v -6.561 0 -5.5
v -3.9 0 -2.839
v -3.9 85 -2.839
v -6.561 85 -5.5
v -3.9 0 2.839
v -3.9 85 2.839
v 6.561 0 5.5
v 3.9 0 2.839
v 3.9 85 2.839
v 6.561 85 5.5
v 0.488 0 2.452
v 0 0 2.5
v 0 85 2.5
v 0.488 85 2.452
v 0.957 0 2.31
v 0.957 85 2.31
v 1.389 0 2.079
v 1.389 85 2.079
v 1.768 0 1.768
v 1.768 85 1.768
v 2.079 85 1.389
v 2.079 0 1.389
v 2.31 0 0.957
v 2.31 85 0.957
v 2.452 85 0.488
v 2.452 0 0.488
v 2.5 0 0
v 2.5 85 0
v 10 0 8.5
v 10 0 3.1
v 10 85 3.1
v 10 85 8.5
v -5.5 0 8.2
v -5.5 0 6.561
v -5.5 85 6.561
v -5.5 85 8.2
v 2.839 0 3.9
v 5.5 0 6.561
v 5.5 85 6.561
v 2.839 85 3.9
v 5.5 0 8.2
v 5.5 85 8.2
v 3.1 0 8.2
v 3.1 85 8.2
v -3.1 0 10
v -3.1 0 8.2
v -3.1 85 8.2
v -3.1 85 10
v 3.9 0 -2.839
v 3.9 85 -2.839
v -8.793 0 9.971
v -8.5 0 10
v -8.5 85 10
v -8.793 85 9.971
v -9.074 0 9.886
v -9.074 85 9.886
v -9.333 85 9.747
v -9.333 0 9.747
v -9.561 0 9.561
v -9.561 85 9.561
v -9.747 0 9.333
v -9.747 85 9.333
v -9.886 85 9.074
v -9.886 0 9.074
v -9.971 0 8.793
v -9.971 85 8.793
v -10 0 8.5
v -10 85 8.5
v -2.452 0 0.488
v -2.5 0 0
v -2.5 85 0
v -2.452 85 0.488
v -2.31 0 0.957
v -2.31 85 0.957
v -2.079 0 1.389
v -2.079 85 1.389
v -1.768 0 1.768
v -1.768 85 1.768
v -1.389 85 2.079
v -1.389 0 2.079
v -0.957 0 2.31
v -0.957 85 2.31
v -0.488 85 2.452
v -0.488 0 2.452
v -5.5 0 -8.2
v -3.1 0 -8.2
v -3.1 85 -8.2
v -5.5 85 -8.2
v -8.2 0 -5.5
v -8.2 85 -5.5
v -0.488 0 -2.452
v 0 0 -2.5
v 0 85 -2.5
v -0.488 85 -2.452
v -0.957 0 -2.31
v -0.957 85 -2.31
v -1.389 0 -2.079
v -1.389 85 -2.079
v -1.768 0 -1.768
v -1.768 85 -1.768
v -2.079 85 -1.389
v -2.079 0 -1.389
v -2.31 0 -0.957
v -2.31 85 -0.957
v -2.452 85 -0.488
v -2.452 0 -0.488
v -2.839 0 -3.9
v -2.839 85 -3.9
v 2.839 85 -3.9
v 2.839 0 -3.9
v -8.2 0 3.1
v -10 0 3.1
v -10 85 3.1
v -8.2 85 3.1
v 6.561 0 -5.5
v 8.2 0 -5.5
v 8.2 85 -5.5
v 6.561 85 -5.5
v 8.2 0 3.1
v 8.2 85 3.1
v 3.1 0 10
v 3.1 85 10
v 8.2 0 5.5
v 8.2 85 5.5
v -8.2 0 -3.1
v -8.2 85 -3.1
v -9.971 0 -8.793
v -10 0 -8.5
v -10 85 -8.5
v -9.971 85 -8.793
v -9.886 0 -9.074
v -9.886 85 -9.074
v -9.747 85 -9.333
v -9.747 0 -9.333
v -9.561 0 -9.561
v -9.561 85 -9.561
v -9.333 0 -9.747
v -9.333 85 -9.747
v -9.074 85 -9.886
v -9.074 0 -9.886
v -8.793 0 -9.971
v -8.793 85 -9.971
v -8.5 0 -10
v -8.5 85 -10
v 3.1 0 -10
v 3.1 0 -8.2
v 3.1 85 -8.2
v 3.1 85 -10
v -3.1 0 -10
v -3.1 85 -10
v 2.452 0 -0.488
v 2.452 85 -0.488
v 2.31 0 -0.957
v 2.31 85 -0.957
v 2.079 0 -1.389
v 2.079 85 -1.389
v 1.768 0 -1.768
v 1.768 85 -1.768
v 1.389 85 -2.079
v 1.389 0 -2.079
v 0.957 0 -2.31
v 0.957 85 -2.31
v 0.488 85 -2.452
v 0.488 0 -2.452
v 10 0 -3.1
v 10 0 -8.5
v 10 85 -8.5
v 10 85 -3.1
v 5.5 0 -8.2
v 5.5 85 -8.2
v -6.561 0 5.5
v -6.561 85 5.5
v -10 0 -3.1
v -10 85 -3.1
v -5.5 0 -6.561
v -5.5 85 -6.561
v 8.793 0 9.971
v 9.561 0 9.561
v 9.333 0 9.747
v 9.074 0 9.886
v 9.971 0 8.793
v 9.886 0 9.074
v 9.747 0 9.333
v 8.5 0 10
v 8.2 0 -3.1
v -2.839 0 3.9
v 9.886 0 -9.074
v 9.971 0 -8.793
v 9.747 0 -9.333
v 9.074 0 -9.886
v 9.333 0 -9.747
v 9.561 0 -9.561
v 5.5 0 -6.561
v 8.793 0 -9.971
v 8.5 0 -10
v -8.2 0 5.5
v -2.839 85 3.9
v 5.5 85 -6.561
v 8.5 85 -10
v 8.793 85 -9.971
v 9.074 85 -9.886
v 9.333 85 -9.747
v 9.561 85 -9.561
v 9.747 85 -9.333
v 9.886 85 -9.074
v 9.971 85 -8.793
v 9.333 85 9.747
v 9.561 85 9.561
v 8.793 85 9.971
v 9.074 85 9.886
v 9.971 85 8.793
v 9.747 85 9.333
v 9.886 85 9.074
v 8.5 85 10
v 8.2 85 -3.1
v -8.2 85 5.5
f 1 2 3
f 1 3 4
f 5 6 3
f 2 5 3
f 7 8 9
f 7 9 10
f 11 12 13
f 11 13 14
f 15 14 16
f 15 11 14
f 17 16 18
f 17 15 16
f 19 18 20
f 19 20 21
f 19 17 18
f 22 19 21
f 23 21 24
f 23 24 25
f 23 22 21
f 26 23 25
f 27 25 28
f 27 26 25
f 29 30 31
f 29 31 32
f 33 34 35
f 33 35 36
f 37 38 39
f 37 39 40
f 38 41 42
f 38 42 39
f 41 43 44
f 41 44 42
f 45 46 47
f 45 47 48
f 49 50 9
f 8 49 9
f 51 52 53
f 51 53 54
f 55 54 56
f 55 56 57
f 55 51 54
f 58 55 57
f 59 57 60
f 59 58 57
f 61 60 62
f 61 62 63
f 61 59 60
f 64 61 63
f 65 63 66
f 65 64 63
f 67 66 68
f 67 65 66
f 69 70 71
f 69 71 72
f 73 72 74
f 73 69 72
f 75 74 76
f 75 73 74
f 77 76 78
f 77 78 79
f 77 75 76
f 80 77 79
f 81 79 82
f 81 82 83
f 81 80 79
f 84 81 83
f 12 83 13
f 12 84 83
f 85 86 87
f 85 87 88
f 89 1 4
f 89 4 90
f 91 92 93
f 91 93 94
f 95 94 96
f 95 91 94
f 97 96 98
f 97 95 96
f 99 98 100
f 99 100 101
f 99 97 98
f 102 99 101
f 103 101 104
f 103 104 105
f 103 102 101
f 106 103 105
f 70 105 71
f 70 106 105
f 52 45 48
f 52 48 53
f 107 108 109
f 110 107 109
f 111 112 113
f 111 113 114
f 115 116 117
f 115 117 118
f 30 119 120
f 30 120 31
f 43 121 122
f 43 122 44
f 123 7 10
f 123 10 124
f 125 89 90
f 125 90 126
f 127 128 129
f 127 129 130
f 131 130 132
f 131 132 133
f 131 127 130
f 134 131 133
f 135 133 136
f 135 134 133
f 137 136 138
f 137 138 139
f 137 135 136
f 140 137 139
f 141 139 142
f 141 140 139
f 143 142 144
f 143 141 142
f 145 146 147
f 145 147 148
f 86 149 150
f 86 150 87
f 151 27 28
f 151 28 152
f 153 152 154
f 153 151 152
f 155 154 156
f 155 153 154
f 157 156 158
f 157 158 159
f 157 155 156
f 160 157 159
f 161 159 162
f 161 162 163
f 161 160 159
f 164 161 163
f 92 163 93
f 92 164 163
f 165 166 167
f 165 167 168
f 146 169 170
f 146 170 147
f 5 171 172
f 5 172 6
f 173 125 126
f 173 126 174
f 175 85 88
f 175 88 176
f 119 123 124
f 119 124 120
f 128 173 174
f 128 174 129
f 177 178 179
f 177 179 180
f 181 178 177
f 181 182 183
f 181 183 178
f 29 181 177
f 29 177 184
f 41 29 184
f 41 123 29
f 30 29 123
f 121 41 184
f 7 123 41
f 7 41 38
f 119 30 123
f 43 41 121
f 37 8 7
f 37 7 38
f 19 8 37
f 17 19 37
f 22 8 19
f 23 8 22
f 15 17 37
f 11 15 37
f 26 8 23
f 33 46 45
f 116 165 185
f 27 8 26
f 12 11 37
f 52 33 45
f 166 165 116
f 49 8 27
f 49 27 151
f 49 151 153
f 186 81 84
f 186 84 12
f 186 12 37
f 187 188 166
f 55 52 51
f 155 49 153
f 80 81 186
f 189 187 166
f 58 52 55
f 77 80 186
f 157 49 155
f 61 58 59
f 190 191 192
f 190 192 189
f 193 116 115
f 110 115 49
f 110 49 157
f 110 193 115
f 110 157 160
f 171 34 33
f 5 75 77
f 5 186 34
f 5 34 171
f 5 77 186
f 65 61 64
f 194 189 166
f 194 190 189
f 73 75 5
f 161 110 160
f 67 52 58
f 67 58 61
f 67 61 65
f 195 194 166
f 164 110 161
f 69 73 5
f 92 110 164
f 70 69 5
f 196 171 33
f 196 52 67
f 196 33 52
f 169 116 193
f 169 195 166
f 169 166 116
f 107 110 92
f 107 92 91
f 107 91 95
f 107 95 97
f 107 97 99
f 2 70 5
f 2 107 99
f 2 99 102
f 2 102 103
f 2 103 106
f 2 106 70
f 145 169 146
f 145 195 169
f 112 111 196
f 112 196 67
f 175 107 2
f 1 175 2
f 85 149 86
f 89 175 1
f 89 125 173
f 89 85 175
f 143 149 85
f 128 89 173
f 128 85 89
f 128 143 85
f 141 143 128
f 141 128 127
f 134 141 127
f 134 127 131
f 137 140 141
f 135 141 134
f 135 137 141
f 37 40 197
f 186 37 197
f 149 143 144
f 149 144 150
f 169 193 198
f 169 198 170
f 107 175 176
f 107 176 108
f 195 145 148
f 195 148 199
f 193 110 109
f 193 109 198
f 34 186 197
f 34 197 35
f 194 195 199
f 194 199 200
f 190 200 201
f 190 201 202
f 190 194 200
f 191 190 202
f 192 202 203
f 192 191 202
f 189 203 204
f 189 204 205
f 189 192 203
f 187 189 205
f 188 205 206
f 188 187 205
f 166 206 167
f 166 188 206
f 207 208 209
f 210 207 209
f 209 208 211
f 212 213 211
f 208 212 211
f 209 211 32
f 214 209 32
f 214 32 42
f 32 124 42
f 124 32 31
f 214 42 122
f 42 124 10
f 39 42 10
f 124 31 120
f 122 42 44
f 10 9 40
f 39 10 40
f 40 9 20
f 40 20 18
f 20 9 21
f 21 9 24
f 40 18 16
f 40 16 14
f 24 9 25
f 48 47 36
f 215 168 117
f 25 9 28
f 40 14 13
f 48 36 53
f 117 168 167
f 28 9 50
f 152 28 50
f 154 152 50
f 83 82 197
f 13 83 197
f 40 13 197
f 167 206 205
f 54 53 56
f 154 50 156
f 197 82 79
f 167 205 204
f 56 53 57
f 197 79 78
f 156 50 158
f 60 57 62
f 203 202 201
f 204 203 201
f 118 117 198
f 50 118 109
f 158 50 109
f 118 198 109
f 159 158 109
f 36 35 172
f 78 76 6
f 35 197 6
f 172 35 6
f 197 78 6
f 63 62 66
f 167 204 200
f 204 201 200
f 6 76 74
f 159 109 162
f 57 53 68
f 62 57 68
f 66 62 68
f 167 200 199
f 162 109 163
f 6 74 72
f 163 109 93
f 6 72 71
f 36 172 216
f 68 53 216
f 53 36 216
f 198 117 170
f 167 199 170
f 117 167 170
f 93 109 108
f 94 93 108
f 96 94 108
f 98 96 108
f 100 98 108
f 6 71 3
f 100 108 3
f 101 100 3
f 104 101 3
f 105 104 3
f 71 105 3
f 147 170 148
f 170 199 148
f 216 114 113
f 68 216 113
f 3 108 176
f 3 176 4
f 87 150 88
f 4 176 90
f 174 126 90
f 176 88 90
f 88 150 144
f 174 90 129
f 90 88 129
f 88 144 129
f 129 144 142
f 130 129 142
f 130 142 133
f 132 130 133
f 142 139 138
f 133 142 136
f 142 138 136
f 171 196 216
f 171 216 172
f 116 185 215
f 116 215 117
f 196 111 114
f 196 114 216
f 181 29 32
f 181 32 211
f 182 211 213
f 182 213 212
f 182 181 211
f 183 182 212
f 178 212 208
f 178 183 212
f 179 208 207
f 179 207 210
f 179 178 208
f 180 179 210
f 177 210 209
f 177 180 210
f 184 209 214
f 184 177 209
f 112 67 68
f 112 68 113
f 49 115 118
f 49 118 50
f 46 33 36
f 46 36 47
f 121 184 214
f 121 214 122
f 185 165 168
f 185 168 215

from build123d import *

# Parameters (mm, degrees)
DODANIE_WYCI_GNI_CIE1_DEPTH = 85


with BuildPart() as part:
    # Szkic1 → Dodanie-wyciągnięcie1 (new body)
    with BuildSketch(Plane(origin=(0, 0, 0), x_dir=(1, 0, 0), z_dir=(0, 1, 0))):
        with BuildLine():
            Line((0, 3.9), (2.839339828, 3.9))
            Line((2.839339828, 3.9), (5.5, 6.560660172))
            Line((5.5, 6.560660172), (5.5, 8.2))
            Line((5.5, 8.2), (3.1, 8.2))
            Line((3.1, 8.2), (3.1, 10))
            Line((3.1, 10), (8.5, 10))
            ThreePointArc((8.5, 10), (9.560660172, 9.560660172), (10, 8.5))
            Line((10, 8.5), (10, 3.1))
            Line((10, 3.1), (8.2, 3.1))
            Line((8.2, 3.1), (8.2, 5.5))
            Line((8.2, 5.5), (6.560660172, 5.5))
            Line((6.560660172, 5.5), (3.9, 2.839339828))
            Line((3.9, 2.839339828), (3.9, 0))
            Line((3.9, 0), (3.9, -2.839339828))
            Line((3.9, -2.839339828), (6.560660172, -5.5))
            Line((6.560660172, -5.5), (8.2, -5.5))
            Line((8.2, -5.5), (8.2, -3.1))
            Line((8.2, -3.1), (10, -3.1))
            Line((10, -3.1), (10, -8.5))
            ThreePointArc((10, -8.5), (9.560660172, -9.560660172), (8.5, -10))
            Line((8.5, -10), (3.1, -10))
            Line((3.1, -10), (3.1, -8.2))
            Line((3.1, -8.2), (5.5, -8.2))
            Line((5.5, -8.2), (5.5, -6.560660172))
            Line((5.5, -6.560660172), (2.839339828, -3.9))
            Line((2.839339828, -3.9), (0, -3.9))
            Line((0, -3.9), (-2.839339828, -3.9))
            Line((-2.839339828, -3.9), (-5.5, -6.560660172))
            Line((-5.5, -6.560660172), (-5.5, -8.2))
            Line((-5.5, -8.2), (-3.1, -8.2))
            Line((-3.1, -8.2), (-3.1, -10))
            Line((-3.1, -10), (-8.5, -10))
            ThreePointArc((-8.5, -10), (-9.560660172, -9.560660172), (-10, -8.5))
            Line((-10, -8.5), (-10, -3.1))
            Line((-10, -3.1), (-8.2, -3.1))
            Line((-8.2, -3.1), (-8.2, -5.5))
            Line((-8.2, -5.5), (-6.560660172, -5.5))
            Line((-6.560660172, -5.5), (-3.9, -2.839339828))
            Line((-3.9, -2.839339828), (-3.9, 0))
            Line((-3.9, 0), (-3.9, 2.839339828))
            Line((-3.9, 2.839339828), (-6.560660172, 5.5))
            Line((-6.560660172, 5.5), (-8.2, 5.5))
            Line((-8.2, 5.5), (-8.2, 3.1))
            Line((-8.2, 3.1), (-10, 3.1))
            Line((-10, 3.1), (-10, 8.5))
            ThreePointArc((-10, 8.5), (-9.560660172, 9.560660172), (-8.5, 10))
            Line((-8.5, 10), (-3.1, 10))
            Line((-3.1, 10), (-3.1, 8.2))
            Line((-3.1, 8.2), (-5.5, 8.2))
            Line((-5.5, 8.2), (-5.5, 6.560660172))
            Line((-5.5, 6.560660172), (-2.839339828, 3.9))
            Line((-2.839339828, 3.9), (0, 3.9))
        make_face()
        with BuildLine():
            ThreePointArc((2.5, 0), (1.767766953, 1.767766953), (0, 2.5))
            ThreePointArc((0, 2.5), (-1.767766953, 1.767766953), (-2.5, 0))
            ThreePointArc((-2.5, 0), (-1.767766953, -1.767766953), (0, -2.5))
            ThreePointArc((0, -2.5), (1.767766953, -1.767766953), (2.5, 0))
        make_face(mode=Mode.SUBTRACT)
    extrude(amount=DODANIE_WYCI_GNI_CIE1_DEPTH)


solid = part.part
